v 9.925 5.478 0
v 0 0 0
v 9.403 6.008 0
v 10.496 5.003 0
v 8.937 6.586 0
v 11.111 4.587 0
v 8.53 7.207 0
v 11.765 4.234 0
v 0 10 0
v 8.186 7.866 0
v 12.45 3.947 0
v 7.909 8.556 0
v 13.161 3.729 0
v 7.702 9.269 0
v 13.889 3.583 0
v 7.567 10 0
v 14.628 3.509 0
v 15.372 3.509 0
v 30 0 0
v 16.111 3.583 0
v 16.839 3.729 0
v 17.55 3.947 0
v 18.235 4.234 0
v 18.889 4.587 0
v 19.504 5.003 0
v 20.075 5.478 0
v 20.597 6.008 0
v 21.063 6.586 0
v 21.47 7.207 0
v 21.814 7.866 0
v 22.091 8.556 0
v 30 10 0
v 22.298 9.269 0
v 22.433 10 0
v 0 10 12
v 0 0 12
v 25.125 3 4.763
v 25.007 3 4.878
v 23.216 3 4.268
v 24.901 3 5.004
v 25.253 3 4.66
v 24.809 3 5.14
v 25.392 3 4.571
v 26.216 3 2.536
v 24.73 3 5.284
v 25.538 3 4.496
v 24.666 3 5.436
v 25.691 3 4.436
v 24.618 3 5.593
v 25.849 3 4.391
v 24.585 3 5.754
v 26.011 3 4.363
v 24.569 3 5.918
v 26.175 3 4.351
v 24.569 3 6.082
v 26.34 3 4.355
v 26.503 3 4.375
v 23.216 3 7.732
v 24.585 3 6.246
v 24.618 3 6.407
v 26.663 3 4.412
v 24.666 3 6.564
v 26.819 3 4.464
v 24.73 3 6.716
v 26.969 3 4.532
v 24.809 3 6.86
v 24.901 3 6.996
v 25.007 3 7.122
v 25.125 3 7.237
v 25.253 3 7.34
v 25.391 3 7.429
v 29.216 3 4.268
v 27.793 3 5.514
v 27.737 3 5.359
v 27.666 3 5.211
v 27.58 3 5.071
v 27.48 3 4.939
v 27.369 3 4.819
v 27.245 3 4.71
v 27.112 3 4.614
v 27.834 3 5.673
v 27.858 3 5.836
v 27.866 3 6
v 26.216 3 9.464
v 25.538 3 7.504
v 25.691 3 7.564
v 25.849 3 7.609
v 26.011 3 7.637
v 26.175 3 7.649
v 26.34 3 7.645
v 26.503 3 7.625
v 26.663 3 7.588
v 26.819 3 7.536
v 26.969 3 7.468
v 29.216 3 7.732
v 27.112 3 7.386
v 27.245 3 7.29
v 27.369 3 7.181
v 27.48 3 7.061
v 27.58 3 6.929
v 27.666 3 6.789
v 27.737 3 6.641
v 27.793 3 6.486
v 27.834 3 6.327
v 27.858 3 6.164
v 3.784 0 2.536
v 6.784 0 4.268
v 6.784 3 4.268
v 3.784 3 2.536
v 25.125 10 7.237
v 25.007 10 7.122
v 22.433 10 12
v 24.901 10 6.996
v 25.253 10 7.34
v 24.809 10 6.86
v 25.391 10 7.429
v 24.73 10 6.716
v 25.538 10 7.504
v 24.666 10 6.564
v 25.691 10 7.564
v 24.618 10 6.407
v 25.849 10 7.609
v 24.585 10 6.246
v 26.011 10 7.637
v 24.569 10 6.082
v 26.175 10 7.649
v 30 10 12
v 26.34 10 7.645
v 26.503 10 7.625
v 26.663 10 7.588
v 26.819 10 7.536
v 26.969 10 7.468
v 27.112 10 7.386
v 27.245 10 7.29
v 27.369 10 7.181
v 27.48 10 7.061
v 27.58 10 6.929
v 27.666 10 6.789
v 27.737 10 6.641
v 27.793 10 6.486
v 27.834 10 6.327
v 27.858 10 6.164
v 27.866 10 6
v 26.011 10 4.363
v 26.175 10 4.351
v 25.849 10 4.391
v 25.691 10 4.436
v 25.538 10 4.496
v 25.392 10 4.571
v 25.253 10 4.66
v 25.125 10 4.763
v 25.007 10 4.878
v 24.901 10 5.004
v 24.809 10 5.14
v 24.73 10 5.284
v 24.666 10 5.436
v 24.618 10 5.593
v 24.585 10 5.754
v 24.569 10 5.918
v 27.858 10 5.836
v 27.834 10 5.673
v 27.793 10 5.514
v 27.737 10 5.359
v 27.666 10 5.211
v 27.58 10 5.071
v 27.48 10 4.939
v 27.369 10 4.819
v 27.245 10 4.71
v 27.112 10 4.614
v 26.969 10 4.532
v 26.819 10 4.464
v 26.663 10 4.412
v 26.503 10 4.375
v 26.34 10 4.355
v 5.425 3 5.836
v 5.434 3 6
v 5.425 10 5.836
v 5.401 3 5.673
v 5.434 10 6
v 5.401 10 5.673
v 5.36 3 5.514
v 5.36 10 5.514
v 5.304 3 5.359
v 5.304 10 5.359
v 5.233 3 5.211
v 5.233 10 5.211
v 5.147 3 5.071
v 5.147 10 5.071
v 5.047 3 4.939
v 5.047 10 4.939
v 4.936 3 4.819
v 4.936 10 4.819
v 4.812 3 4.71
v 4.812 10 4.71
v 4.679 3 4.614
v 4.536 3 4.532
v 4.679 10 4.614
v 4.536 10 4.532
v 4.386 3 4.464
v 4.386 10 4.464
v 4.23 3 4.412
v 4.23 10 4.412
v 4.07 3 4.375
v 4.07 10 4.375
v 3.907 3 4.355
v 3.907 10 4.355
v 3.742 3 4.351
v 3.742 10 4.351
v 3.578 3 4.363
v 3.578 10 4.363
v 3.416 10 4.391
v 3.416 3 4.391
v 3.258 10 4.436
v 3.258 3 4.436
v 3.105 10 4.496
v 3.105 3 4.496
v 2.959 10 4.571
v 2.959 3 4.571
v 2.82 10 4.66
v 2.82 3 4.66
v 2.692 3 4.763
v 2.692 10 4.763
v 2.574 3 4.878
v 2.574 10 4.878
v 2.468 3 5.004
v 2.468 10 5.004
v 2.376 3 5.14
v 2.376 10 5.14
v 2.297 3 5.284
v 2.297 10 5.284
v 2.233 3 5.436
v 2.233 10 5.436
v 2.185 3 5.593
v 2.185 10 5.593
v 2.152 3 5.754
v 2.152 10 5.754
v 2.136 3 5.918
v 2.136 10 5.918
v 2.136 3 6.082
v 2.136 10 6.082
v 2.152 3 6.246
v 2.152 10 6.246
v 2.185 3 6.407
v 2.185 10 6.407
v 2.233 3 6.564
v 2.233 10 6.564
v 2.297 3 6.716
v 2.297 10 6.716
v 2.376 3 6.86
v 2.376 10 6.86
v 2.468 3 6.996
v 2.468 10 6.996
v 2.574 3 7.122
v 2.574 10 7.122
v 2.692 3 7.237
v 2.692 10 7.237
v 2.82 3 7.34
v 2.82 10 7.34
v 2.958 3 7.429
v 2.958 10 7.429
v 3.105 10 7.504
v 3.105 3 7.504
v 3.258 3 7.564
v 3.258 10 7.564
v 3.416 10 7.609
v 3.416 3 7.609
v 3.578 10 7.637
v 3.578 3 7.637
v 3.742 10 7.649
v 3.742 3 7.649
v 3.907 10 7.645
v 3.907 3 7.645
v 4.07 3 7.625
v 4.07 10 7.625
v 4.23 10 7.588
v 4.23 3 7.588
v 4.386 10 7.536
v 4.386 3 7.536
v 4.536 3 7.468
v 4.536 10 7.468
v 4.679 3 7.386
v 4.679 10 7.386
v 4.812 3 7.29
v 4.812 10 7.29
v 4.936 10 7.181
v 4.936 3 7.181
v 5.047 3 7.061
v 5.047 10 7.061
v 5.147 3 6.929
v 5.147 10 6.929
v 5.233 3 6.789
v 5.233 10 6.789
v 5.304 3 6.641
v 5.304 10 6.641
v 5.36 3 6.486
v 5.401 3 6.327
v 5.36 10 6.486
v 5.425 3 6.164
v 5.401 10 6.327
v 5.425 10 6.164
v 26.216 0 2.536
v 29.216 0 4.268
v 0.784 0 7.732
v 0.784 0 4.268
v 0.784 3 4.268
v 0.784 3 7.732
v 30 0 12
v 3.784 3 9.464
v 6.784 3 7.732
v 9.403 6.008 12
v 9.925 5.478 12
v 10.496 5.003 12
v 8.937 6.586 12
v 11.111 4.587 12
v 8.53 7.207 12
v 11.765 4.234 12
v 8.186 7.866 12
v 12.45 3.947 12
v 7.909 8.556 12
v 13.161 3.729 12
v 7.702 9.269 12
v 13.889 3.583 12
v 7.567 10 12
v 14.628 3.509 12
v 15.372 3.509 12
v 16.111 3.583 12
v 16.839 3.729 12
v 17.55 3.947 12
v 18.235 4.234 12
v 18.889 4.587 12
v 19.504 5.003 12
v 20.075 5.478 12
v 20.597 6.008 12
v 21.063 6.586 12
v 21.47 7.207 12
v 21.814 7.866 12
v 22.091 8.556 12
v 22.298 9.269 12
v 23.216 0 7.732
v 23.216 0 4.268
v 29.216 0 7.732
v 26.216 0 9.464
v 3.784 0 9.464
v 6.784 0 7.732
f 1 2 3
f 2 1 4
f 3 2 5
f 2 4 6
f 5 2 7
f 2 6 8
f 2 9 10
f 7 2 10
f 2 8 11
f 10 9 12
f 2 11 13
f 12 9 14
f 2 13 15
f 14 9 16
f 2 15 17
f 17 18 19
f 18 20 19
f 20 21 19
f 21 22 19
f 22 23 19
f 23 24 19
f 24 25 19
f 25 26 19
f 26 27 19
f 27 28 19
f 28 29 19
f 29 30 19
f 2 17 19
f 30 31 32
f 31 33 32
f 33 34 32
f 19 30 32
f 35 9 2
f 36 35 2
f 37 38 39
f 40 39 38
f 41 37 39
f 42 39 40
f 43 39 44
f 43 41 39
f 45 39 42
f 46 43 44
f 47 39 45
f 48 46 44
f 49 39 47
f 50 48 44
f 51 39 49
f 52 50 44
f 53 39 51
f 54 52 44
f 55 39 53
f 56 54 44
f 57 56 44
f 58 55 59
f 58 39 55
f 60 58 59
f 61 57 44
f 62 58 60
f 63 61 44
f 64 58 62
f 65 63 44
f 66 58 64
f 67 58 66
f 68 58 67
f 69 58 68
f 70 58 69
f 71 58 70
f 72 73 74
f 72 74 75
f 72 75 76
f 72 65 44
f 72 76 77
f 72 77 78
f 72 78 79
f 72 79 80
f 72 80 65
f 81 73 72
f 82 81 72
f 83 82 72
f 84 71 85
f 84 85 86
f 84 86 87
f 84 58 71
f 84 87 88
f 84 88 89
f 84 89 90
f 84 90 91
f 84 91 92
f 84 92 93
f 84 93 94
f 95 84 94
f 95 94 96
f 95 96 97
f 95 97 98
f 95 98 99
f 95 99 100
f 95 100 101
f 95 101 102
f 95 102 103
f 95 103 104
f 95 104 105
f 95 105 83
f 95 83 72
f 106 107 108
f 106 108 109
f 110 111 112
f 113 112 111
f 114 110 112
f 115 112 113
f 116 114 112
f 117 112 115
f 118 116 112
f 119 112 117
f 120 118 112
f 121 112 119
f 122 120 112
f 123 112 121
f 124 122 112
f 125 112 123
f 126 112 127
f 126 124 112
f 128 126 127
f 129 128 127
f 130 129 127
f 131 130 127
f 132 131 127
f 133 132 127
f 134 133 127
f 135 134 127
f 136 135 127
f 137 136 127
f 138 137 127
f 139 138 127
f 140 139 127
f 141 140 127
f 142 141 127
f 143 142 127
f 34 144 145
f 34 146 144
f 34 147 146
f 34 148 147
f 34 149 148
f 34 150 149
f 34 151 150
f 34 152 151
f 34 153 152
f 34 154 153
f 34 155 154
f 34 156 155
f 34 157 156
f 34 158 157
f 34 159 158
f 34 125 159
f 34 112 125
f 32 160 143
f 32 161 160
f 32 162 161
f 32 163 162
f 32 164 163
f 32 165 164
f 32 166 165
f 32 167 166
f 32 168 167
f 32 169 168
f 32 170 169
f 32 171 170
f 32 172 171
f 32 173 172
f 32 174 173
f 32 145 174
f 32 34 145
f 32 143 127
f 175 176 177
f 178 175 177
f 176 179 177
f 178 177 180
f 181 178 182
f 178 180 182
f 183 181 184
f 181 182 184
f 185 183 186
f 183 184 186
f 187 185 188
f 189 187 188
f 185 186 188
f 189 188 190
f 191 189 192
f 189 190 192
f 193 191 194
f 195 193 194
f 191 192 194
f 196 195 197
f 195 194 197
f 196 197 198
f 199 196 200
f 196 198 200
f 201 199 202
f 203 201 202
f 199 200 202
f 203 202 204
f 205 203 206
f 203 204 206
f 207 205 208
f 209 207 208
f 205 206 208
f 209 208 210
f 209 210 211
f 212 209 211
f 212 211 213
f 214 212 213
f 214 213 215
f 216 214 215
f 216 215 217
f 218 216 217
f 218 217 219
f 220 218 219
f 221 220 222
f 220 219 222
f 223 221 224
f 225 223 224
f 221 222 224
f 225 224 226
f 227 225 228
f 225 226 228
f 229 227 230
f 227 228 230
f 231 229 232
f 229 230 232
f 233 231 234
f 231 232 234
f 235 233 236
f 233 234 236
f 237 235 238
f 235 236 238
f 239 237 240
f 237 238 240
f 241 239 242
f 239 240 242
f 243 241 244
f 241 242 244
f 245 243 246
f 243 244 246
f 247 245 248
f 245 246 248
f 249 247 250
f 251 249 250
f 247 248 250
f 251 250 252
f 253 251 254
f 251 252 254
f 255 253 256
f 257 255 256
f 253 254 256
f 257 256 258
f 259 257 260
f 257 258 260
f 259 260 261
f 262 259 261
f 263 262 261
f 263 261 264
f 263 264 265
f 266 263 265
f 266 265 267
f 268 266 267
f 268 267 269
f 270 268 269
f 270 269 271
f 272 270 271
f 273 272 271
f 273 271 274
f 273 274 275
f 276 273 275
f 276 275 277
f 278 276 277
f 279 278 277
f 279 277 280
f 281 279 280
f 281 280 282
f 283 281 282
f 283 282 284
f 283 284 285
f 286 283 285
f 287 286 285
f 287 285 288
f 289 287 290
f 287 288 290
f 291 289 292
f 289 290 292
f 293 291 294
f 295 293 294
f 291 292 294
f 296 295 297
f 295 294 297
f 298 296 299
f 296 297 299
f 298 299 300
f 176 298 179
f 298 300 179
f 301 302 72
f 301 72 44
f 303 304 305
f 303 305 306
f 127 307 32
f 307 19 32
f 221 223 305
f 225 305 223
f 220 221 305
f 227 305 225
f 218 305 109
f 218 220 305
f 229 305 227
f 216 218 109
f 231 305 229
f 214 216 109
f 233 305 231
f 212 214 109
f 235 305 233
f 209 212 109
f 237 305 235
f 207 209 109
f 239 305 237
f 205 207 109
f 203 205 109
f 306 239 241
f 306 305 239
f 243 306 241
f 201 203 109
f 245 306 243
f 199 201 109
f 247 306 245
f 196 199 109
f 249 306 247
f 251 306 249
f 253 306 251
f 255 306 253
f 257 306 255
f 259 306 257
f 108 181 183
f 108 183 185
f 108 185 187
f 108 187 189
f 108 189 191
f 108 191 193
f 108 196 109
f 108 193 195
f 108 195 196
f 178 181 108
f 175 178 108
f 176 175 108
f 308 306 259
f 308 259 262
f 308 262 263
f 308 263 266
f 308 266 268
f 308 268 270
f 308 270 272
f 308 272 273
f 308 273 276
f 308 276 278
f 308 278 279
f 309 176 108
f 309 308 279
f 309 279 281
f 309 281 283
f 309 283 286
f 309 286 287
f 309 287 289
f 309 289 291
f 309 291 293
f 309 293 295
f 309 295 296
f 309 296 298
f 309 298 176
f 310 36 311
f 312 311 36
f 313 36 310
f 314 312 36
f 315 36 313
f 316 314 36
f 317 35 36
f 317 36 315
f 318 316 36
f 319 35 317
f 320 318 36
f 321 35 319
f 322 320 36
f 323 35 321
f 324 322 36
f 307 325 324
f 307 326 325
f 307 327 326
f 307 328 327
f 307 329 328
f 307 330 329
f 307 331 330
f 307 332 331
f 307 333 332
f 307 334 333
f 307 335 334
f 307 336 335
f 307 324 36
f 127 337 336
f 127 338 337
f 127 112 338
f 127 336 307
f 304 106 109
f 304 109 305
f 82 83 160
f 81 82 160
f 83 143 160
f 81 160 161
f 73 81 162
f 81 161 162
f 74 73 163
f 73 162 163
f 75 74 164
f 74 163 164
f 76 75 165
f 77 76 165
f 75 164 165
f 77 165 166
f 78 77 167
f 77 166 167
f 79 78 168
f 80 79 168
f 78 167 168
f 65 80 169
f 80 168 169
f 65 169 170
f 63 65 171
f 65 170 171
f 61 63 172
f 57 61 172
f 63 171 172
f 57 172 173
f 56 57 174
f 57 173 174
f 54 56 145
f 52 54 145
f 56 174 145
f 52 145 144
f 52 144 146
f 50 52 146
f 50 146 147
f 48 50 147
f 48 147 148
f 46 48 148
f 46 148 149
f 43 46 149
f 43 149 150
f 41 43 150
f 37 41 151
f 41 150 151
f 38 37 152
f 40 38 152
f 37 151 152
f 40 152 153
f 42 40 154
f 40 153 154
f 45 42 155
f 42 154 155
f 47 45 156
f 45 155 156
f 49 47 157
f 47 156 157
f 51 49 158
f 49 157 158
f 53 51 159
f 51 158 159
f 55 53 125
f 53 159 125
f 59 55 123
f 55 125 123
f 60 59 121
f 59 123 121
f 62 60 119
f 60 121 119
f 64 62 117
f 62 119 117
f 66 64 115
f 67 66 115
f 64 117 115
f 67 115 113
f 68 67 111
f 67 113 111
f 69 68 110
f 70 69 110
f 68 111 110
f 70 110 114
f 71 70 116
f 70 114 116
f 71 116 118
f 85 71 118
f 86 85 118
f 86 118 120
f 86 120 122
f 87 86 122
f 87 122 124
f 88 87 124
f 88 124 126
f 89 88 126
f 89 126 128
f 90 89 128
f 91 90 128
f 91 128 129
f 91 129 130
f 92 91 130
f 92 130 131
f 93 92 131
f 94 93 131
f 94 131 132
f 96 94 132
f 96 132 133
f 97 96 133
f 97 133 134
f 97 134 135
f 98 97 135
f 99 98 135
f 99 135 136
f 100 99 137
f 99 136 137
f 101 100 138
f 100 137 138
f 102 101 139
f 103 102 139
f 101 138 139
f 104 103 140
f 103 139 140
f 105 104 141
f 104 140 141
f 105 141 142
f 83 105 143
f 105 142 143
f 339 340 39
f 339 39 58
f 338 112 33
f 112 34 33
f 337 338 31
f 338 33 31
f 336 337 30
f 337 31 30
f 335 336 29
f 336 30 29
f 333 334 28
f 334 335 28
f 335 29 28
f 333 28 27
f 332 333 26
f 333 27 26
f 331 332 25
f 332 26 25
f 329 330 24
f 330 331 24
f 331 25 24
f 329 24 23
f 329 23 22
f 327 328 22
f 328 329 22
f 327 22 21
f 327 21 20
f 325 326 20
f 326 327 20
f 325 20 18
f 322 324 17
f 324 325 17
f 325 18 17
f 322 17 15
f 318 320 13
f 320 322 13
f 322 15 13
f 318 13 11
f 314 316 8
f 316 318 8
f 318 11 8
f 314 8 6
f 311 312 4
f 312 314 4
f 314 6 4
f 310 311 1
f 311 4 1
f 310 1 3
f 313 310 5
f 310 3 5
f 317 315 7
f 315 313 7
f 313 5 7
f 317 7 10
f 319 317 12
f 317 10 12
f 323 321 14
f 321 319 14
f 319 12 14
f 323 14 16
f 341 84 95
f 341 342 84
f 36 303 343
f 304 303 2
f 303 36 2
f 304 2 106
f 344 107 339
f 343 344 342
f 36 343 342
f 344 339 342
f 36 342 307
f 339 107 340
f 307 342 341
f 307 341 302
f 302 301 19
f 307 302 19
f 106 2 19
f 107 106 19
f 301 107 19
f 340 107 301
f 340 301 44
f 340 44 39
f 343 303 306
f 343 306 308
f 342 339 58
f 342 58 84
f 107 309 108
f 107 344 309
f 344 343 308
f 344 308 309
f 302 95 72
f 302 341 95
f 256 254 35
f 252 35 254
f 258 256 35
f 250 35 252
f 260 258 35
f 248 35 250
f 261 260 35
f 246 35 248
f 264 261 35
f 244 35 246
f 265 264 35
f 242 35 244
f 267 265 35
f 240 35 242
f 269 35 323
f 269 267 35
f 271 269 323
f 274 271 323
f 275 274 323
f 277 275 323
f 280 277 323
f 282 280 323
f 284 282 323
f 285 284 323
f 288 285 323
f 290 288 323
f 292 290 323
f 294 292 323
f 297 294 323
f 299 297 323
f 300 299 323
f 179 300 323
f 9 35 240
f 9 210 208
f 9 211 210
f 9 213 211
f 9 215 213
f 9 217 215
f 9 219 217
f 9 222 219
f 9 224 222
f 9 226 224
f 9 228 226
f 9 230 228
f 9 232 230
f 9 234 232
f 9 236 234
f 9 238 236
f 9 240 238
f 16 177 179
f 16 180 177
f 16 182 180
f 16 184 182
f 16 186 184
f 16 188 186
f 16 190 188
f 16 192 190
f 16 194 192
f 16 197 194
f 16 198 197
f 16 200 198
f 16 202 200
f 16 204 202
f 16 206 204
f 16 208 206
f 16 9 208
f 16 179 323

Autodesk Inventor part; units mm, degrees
ref_plane "YZ Plane" through (0, 0, 0) normal (1, 0, 0) x (0, 1, 0)
ref_plane "XZ Plane" through (0, 0, 0) normal (0, 1, 0) x (-1, 0, 0)
ref_plane "XY Plane" through (0, 0, 0) normal (0, 0, 1) x (1, 0, 0)
sketch "Sketch1" plane through (0, 0, 0) normal (0, 0, 1) x (1, 0, 0)
  line L0 (0, 0) -> (30, 0)
  line L1 (30, 0) -> (30, 10)
  line L2 (30, 10) -> (0, 10) construction
  line L3 (0, 10) -> (0, 0)
  arc A0 (7.567, 10) -> (22.433, 10) centre (15, 11) ccw
  line L4 (0, 10) -> (7.567, 10)
  line L5 (22.433, 10) -> (30, 10)
  point P0 (15, 10)
  dimension "d0" = 30
  dimension "d1" = 10
  dimension "d2" = 15
  dimension "d3" = 1
extrude "Extrusion1" add sketch "Sketch1" along normal blind 12
sketch "Sketch2" plane through (0, 10, 0) normal (0, 1, 0) x (1, 0, 0)
  line L0 (0, 0) -> (0, -12) construction
  line L1 (7.567, -12) -> (0, -12) construction
  line L2 (30, -12) -> (22.433, -12) construction
  circle A0 centre (3.7835, -6) radius 1.65
  circle A1 centre (26.2165, -6) radius 1.65
  point P0 (0, -6)
  point P1 (3.7835, -12)
  point P2 (26.2165, -12)
  dimension "d6" = 3.3
  dimension "d7" = 3.3
extrude "Extrusion2" cut sketch "Sketch2" against normal blind 15
sketch "Sketch3" plane through (0, 0, 0) normal (0, -1, 0) x (1, 0, 0)
  circle A0 centre (3.7835, 6) radius 1.65 construction
  circle A1 centre (26.2165, 6) radius 1.65 construction
  line L0 (6.7835, 7.7321) -> (6.7835, 4.2679)
  line L1 (6.7835, 4.2679) -> (3.7835, 2.5359)
  line L2 (3.7835, 2.5359) -> (0.7835, 4.2679)
  line L3 (0.7835, 4.2679) -> (0.7835, 7.7321)
  line L4 (0.7835, 7.7321) -> (3.7835, 9.4641)
  line L5 (3.7835, 9.4641) -> (6.7835, 7.7321)
  line L6 (29.2165, 7.7321) -> (29.2165, 4.2679)
  line L7 (29.2165, 4.2679) -> (26.2165, 2.5359)
  line L8 (26.2165, 2.5359) -> (23.2165, 4.2679)
  line L9 (23.2165, 4.2679) -> (23.2165, 7.7321)
  line L10 (23.2165, 7.7321) -> (26.2165, 9.4641)
  line L11 (26.2165, 9.4641) -> (29.2165, 7.7321)
  point P0 (0, 0)
  dimension "d10" = 6
  dimension "d11" = 6
extrude "Extrusion3" cut sketch "Sketch3" against normal blind 3
equation "\"d6\" = d7"
properties part number "8mm Rod clamp"
